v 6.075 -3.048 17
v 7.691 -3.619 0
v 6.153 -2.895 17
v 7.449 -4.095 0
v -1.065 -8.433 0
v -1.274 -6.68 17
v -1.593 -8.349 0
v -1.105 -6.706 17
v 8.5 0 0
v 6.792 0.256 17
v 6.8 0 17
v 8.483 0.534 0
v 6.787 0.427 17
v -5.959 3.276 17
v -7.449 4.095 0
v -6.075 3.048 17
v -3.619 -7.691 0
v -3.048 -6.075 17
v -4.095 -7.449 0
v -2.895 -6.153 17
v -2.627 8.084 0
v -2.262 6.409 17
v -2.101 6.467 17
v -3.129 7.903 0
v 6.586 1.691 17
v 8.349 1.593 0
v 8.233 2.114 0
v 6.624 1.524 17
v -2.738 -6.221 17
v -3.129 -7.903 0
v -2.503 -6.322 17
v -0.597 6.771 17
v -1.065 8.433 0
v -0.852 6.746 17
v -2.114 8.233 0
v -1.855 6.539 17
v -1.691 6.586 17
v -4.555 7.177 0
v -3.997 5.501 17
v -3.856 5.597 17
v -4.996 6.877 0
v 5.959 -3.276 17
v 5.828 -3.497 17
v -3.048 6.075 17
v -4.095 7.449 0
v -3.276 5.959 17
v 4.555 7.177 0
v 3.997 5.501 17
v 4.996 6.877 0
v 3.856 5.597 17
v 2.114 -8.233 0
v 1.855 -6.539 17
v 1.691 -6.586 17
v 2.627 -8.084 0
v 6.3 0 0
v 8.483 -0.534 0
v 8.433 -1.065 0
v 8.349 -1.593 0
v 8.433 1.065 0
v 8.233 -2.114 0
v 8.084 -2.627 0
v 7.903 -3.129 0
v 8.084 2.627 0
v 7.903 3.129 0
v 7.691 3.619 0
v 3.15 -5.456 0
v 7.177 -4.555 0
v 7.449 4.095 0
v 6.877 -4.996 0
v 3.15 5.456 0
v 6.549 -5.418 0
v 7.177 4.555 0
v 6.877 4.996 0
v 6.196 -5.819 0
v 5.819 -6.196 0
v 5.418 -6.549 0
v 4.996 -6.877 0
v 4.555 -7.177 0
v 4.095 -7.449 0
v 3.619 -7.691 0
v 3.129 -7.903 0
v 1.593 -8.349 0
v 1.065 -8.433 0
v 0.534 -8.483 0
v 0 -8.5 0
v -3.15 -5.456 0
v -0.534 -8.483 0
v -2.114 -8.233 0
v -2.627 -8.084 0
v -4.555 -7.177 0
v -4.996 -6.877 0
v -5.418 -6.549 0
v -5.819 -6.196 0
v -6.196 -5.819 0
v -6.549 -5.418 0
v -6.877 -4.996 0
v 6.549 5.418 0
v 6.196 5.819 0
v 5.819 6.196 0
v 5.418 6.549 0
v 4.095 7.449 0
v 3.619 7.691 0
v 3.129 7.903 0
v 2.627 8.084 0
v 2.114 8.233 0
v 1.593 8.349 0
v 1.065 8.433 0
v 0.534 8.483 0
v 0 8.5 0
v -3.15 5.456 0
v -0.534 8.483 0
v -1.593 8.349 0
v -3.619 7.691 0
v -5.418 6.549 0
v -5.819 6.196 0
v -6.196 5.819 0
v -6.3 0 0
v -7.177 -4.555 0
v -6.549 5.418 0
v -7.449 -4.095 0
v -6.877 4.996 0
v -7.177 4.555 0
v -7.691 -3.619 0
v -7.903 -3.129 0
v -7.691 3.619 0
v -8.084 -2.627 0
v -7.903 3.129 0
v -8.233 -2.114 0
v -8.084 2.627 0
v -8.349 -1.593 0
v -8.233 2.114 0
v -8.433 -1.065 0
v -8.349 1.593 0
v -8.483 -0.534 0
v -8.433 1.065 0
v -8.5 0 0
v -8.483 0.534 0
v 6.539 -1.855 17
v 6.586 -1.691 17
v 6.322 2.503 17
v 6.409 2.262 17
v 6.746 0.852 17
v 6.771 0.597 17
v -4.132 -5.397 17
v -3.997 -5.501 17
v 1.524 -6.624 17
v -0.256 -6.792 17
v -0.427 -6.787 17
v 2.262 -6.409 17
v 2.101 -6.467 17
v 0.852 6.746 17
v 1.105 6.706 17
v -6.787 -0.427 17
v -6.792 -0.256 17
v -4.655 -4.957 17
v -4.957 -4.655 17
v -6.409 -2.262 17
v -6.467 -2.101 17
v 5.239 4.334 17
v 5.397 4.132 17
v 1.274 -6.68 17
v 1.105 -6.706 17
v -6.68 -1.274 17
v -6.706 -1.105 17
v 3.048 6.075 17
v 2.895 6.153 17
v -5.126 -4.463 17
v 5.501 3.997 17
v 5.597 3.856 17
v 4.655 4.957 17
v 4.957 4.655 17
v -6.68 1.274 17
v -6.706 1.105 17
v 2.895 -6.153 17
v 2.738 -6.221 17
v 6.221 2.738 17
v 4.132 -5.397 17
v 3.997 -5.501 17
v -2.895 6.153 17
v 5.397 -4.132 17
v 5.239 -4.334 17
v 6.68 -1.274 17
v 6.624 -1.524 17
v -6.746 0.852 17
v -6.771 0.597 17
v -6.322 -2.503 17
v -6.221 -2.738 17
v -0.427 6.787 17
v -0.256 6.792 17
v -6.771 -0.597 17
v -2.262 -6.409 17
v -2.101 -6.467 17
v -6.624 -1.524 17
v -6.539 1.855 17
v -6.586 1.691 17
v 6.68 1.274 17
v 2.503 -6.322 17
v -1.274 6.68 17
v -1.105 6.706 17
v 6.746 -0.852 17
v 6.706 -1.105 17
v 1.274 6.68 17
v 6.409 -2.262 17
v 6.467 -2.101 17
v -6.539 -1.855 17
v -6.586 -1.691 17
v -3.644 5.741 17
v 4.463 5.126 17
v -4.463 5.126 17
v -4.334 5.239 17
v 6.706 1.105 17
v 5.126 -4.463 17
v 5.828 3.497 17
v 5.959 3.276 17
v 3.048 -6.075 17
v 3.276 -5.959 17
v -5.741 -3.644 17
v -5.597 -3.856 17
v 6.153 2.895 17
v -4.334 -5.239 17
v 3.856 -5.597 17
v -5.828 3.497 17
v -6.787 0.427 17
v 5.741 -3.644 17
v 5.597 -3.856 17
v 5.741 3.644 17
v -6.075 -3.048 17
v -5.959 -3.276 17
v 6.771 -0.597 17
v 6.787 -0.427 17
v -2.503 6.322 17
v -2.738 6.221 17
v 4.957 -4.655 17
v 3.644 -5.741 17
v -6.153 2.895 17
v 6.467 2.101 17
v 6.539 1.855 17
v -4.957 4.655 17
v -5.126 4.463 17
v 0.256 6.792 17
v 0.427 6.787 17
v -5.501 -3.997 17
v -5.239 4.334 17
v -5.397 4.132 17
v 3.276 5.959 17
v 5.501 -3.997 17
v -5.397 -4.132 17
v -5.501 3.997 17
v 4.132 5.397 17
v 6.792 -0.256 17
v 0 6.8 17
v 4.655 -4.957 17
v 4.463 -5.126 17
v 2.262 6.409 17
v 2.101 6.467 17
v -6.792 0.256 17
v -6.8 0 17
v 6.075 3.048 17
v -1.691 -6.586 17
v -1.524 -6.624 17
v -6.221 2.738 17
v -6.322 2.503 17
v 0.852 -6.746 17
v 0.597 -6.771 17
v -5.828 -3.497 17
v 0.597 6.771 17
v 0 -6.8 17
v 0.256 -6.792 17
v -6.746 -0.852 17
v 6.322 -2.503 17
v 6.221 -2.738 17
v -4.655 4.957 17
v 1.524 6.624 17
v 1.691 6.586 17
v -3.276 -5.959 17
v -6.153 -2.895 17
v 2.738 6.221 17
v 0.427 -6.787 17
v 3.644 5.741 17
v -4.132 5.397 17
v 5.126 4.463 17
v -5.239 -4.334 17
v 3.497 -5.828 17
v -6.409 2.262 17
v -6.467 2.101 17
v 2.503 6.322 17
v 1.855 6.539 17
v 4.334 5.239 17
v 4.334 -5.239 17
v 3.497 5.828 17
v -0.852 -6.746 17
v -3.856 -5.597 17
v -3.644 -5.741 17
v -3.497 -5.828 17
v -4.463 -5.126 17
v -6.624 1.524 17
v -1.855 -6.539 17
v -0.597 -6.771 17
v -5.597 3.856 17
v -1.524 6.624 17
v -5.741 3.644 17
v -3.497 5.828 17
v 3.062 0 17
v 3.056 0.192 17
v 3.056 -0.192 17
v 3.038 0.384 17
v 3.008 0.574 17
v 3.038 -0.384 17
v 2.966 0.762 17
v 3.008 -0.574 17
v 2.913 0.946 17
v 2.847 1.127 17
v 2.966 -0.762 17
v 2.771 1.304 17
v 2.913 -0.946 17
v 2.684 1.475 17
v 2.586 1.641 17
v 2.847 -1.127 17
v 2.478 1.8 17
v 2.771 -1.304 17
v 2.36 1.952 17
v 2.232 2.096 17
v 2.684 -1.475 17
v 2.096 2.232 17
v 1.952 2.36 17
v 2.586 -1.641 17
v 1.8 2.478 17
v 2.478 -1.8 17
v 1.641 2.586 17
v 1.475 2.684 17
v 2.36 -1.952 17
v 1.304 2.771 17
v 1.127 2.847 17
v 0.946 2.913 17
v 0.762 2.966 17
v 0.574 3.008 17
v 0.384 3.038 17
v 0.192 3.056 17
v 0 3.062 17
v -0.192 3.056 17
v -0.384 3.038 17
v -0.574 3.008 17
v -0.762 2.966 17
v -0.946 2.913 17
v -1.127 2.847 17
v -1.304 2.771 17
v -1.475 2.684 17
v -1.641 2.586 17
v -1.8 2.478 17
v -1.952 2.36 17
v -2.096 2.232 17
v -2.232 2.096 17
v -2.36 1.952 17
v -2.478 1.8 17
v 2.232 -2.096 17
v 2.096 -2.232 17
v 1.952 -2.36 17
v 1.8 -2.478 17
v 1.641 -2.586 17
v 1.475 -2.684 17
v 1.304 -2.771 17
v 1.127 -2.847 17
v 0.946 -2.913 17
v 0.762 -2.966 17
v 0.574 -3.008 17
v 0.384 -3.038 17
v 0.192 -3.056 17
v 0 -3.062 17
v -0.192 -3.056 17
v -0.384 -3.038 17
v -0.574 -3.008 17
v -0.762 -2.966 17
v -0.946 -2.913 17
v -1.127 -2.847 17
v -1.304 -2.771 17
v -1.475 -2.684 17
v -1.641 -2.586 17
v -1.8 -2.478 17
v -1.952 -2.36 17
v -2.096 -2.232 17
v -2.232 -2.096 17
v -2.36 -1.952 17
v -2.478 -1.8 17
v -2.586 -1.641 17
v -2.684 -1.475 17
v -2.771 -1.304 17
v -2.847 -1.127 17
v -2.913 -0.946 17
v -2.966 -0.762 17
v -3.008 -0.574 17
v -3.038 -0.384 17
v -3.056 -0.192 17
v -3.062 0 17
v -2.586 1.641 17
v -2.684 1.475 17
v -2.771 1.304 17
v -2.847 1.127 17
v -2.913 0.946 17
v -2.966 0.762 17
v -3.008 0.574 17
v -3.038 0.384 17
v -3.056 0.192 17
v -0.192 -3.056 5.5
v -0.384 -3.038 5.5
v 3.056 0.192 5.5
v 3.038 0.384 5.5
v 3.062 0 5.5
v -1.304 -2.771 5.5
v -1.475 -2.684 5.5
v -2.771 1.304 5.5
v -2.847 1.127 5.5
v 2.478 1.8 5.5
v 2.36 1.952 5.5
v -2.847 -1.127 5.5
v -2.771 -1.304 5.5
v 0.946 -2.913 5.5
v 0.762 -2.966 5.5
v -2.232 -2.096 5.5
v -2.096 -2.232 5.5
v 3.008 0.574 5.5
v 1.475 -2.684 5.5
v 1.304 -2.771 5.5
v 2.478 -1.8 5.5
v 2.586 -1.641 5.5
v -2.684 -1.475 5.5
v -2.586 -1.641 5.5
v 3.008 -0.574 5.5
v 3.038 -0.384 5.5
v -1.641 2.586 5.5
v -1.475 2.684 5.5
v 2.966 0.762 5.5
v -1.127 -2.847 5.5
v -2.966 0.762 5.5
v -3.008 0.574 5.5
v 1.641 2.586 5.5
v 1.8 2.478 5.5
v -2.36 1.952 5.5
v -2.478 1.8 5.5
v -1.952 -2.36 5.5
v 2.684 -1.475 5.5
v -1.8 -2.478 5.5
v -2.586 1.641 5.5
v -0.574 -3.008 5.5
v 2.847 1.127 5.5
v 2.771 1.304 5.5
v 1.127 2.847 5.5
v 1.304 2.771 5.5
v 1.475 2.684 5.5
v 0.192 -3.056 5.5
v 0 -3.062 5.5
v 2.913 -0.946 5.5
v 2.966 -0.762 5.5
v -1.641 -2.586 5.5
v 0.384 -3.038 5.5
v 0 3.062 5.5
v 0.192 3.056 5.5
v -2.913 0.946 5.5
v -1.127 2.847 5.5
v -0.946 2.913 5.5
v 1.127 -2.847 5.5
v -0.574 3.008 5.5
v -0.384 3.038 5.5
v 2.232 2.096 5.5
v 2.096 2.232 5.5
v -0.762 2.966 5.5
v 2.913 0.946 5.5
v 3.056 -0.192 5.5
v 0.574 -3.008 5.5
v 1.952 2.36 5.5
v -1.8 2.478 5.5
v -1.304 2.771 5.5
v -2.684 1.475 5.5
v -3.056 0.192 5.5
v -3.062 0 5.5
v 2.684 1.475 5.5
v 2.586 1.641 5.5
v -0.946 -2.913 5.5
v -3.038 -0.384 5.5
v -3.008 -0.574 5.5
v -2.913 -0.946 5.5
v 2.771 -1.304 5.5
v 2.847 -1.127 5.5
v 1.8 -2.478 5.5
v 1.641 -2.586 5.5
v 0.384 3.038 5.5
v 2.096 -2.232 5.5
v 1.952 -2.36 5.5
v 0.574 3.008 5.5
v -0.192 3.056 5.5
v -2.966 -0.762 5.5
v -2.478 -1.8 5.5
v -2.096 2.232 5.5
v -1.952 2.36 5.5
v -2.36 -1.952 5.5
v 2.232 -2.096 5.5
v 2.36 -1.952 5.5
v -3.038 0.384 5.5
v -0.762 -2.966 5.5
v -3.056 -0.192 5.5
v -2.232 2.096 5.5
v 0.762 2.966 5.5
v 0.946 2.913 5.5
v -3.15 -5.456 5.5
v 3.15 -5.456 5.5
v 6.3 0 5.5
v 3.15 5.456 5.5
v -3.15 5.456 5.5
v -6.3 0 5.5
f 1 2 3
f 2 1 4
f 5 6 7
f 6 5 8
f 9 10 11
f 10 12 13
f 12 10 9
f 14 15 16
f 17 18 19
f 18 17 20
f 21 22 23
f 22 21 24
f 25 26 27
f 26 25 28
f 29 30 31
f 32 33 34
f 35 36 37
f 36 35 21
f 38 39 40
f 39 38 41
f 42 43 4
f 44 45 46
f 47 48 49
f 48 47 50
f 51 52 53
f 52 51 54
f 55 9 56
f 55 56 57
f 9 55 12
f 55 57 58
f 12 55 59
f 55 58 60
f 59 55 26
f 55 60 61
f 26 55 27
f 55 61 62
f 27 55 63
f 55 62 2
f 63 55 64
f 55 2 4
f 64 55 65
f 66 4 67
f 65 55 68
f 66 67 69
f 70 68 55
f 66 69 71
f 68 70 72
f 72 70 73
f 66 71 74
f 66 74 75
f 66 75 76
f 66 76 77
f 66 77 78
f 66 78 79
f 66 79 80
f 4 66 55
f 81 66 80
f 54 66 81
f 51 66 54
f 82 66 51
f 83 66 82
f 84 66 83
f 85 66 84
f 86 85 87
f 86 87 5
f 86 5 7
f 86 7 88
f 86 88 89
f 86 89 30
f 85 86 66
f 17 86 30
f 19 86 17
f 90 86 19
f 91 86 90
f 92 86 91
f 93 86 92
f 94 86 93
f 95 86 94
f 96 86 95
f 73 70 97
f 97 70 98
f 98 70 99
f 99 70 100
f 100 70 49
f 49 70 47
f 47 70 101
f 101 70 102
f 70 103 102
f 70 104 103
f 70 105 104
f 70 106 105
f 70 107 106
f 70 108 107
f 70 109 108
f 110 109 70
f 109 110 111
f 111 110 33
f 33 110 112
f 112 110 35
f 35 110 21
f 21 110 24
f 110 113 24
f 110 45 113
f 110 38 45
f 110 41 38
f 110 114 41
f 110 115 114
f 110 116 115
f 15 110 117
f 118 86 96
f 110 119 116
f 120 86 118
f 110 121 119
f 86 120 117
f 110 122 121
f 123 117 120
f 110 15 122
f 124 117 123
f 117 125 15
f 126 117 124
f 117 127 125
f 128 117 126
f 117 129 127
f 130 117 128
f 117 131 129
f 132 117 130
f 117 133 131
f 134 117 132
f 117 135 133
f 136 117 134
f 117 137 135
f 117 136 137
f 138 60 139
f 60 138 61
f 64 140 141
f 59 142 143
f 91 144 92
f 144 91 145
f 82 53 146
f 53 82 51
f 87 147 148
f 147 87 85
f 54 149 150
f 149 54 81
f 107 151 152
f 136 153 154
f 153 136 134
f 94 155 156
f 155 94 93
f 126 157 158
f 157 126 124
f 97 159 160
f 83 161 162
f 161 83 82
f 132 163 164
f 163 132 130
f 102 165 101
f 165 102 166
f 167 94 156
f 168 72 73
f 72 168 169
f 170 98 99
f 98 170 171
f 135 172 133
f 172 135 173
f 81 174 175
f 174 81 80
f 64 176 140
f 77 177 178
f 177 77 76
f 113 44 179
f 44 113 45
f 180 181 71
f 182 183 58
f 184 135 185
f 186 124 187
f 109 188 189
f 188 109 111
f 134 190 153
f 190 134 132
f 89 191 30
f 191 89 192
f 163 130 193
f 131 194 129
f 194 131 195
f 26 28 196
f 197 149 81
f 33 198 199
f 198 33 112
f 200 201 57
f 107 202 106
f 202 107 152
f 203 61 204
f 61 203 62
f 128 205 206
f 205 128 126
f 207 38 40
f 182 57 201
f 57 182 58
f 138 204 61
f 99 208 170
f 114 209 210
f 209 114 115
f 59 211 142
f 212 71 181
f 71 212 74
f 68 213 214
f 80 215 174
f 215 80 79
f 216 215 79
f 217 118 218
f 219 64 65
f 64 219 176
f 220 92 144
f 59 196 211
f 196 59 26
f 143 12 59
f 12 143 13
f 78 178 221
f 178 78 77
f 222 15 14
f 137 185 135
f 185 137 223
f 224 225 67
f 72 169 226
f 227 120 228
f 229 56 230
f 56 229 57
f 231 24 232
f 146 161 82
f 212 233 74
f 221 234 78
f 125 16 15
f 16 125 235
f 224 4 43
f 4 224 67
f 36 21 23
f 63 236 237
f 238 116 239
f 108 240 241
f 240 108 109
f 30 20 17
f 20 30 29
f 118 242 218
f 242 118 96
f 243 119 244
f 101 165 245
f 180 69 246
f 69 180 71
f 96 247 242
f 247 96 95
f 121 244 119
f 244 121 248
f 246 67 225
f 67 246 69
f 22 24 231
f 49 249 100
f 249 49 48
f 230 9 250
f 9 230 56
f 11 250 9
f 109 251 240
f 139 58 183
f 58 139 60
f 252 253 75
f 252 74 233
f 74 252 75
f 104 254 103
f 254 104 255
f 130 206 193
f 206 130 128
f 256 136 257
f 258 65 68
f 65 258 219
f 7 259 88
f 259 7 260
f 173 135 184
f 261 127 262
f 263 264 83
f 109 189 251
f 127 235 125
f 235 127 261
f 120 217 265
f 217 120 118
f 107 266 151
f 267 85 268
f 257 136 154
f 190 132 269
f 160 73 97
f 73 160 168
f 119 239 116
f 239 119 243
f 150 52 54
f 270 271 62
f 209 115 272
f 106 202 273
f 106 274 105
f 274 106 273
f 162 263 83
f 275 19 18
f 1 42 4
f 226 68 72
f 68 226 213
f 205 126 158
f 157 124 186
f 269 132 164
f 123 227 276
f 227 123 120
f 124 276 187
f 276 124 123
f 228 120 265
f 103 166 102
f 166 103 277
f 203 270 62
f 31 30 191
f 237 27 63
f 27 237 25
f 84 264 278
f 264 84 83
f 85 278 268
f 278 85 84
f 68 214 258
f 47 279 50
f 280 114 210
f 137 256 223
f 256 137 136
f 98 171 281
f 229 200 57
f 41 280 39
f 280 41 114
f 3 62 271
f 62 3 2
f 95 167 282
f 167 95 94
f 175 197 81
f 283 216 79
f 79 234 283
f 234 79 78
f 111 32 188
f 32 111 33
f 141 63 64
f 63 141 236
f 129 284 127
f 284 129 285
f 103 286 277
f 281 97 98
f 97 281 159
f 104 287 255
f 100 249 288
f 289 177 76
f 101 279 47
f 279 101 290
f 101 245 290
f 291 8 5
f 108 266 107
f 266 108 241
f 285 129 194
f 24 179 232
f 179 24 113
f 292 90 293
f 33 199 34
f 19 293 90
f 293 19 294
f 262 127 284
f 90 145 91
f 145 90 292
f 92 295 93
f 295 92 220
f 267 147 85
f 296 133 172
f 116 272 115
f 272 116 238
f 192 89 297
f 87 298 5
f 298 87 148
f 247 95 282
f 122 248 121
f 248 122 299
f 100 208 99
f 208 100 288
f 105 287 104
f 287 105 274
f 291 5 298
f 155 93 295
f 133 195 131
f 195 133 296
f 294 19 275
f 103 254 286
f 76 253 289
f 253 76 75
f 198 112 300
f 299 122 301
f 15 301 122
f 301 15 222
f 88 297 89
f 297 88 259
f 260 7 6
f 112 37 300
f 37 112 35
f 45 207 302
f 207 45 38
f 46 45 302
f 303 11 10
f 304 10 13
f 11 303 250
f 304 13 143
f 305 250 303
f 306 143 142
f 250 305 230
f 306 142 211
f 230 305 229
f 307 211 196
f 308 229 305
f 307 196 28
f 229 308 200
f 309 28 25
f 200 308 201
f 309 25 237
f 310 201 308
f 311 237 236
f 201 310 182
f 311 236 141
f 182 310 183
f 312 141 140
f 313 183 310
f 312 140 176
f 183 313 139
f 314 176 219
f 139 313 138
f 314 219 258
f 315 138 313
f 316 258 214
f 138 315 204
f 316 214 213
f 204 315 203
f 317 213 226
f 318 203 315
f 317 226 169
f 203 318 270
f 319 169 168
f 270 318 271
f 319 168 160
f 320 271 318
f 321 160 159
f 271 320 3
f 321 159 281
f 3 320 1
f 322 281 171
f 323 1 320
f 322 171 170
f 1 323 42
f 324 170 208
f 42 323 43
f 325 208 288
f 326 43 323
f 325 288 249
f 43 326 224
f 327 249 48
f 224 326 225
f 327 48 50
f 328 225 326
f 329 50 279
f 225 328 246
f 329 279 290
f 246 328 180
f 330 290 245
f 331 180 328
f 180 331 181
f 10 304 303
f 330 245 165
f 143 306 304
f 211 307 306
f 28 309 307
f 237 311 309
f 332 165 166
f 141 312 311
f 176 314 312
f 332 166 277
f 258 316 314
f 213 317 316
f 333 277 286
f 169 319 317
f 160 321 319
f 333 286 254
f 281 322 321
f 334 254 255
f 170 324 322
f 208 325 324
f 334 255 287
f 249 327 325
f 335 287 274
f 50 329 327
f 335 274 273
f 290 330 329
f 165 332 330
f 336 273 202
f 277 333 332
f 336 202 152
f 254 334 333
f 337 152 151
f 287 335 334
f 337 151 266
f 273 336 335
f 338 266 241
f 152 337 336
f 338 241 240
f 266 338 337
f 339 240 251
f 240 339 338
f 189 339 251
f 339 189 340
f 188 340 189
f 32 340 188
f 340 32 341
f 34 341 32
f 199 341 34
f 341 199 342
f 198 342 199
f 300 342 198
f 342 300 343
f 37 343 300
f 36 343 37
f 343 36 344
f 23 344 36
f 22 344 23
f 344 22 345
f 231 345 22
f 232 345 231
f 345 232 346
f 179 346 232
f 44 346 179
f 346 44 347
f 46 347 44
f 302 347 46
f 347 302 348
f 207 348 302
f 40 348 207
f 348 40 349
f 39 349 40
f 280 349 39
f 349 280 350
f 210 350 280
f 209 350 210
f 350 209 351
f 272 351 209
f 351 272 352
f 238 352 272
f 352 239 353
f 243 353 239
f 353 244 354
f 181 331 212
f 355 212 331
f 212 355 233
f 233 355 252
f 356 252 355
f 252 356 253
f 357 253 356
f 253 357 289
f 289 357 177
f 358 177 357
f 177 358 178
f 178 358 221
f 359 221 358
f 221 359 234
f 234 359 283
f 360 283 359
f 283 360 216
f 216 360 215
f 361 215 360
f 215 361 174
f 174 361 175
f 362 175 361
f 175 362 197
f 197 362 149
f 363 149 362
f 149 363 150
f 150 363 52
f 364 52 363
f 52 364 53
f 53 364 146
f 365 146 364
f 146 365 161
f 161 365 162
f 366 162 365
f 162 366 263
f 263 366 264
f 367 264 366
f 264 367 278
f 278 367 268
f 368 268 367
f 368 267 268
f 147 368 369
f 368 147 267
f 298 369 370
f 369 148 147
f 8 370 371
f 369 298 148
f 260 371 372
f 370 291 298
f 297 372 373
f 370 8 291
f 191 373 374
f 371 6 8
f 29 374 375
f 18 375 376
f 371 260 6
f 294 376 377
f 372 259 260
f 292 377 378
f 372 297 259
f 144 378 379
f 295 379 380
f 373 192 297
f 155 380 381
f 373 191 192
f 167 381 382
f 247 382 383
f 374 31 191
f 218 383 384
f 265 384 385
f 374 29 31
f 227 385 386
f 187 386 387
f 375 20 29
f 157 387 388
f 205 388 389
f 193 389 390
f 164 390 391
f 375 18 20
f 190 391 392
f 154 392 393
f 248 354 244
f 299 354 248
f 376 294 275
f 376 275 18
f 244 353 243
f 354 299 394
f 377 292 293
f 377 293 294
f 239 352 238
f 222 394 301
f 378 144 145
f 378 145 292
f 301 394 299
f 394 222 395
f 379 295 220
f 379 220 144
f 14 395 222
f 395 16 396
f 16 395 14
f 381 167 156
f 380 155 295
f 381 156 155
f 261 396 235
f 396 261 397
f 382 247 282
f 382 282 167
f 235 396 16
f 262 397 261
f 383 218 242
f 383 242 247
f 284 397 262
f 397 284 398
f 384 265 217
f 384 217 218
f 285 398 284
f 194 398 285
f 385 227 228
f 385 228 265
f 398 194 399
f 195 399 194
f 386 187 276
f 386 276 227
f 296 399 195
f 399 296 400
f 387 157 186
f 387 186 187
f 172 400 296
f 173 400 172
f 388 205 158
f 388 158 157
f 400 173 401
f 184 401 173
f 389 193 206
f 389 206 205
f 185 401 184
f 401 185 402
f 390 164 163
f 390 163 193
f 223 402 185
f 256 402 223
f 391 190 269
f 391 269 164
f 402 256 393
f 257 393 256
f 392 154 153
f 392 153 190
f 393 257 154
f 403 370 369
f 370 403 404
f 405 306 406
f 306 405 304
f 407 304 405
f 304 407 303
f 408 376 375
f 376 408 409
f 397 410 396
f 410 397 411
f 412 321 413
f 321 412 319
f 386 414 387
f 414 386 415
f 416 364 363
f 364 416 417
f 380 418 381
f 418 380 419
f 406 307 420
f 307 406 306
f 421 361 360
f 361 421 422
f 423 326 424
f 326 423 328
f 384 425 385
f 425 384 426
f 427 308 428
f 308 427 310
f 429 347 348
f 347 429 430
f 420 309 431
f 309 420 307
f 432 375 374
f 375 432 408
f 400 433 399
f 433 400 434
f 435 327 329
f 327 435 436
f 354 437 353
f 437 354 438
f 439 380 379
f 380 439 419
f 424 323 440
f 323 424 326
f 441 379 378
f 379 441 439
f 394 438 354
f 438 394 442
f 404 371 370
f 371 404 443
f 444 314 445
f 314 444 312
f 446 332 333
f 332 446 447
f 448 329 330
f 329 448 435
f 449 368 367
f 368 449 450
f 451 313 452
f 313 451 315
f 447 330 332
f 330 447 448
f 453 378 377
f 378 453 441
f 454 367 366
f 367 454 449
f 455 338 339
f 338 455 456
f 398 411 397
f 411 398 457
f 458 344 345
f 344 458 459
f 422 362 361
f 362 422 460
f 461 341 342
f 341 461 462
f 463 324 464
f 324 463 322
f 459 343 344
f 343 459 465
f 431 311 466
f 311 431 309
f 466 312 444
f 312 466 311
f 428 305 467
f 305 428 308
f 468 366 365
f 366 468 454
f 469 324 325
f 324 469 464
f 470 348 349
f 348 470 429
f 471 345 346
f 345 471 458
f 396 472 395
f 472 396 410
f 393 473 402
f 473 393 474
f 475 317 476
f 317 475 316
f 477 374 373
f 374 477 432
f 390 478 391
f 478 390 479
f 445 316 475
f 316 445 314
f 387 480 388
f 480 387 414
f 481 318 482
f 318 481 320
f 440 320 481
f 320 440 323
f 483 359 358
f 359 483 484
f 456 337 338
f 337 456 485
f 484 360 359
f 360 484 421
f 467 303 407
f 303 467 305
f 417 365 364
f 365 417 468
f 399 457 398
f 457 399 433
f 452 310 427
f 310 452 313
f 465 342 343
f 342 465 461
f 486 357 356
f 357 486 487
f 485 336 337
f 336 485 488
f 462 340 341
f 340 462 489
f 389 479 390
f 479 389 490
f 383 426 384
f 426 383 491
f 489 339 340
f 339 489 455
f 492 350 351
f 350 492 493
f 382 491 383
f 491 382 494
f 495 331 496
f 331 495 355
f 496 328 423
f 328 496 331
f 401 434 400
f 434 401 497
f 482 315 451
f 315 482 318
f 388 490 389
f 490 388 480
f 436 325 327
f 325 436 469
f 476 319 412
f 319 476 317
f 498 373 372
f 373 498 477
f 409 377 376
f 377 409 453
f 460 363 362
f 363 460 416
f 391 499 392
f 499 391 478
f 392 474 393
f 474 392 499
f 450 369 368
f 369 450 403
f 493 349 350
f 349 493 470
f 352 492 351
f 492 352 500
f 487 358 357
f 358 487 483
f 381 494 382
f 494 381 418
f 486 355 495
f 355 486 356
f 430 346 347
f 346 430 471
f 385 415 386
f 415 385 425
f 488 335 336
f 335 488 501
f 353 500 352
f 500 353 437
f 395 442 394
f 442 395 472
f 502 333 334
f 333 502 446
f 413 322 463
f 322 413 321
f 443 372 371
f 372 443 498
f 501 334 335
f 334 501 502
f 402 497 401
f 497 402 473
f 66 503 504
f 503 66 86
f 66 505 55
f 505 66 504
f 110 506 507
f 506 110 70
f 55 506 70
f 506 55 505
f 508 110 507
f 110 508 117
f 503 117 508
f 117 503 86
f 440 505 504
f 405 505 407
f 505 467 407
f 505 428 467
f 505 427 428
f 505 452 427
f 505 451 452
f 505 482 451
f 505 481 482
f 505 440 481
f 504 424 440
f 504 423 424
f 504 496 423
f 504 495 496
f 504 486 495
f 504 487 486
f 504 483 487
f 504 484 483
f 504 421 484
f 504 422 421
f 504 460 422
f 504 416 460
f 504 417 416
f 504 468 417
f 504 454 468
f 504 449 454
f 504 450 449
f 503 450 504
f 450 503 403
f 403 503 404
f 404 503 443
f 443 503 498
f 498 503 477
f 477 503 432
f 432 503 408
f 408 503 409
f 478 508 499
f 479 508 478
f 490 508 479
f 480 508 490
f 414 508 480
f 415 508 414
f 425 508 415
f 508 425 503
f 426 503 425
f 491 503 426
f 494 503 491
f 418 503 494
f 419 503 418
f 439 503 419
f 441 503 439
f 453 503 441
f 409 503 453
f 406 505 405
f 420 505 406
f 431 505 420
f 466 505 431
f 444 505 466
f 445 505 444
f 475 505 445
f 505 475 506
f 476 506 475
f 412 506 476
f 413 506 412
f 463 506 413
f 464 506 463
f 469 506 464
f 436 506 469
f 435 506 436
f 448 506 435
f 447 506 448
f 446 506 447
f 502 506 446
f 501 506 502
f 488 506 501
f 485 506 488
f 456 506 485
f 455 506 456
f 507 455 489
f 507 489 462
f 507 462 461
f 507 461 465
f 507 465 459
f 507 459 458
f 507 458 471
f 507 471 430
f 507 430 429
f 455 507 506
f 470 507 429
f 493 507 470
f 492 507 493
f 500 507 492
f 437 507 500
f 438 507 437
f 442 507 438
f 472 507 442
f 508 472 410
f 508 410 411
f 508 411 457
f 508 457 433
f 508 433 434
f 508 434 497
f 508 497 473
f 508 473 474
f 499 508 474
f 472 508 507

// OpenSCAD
$fn = 100;
h1 = 25;
sd = 6.125; //fixing bolt diameter
n1 = 5.5; //fixing nut height
n2 = 12.6; //fixing nut diamemter

difference() {
insert_plug();
cutout();
}

module insert_plug(){
    difference(){
translate([0,0,h1/2])
cylinder(h=h1, d1=17, d2=12,center=true);
translate([0,0,h1-8])
cylinder(h=8, d = 20);
}
}

module cutout(){
    union(){
        screw_hole();
        nut_socket();
    }
}

module screw_hole() {
cylinder(h=h1, d=sd);
}

module nut_socket() {
$fn = 6;
cylinder(h=n1, d=n2);
}
